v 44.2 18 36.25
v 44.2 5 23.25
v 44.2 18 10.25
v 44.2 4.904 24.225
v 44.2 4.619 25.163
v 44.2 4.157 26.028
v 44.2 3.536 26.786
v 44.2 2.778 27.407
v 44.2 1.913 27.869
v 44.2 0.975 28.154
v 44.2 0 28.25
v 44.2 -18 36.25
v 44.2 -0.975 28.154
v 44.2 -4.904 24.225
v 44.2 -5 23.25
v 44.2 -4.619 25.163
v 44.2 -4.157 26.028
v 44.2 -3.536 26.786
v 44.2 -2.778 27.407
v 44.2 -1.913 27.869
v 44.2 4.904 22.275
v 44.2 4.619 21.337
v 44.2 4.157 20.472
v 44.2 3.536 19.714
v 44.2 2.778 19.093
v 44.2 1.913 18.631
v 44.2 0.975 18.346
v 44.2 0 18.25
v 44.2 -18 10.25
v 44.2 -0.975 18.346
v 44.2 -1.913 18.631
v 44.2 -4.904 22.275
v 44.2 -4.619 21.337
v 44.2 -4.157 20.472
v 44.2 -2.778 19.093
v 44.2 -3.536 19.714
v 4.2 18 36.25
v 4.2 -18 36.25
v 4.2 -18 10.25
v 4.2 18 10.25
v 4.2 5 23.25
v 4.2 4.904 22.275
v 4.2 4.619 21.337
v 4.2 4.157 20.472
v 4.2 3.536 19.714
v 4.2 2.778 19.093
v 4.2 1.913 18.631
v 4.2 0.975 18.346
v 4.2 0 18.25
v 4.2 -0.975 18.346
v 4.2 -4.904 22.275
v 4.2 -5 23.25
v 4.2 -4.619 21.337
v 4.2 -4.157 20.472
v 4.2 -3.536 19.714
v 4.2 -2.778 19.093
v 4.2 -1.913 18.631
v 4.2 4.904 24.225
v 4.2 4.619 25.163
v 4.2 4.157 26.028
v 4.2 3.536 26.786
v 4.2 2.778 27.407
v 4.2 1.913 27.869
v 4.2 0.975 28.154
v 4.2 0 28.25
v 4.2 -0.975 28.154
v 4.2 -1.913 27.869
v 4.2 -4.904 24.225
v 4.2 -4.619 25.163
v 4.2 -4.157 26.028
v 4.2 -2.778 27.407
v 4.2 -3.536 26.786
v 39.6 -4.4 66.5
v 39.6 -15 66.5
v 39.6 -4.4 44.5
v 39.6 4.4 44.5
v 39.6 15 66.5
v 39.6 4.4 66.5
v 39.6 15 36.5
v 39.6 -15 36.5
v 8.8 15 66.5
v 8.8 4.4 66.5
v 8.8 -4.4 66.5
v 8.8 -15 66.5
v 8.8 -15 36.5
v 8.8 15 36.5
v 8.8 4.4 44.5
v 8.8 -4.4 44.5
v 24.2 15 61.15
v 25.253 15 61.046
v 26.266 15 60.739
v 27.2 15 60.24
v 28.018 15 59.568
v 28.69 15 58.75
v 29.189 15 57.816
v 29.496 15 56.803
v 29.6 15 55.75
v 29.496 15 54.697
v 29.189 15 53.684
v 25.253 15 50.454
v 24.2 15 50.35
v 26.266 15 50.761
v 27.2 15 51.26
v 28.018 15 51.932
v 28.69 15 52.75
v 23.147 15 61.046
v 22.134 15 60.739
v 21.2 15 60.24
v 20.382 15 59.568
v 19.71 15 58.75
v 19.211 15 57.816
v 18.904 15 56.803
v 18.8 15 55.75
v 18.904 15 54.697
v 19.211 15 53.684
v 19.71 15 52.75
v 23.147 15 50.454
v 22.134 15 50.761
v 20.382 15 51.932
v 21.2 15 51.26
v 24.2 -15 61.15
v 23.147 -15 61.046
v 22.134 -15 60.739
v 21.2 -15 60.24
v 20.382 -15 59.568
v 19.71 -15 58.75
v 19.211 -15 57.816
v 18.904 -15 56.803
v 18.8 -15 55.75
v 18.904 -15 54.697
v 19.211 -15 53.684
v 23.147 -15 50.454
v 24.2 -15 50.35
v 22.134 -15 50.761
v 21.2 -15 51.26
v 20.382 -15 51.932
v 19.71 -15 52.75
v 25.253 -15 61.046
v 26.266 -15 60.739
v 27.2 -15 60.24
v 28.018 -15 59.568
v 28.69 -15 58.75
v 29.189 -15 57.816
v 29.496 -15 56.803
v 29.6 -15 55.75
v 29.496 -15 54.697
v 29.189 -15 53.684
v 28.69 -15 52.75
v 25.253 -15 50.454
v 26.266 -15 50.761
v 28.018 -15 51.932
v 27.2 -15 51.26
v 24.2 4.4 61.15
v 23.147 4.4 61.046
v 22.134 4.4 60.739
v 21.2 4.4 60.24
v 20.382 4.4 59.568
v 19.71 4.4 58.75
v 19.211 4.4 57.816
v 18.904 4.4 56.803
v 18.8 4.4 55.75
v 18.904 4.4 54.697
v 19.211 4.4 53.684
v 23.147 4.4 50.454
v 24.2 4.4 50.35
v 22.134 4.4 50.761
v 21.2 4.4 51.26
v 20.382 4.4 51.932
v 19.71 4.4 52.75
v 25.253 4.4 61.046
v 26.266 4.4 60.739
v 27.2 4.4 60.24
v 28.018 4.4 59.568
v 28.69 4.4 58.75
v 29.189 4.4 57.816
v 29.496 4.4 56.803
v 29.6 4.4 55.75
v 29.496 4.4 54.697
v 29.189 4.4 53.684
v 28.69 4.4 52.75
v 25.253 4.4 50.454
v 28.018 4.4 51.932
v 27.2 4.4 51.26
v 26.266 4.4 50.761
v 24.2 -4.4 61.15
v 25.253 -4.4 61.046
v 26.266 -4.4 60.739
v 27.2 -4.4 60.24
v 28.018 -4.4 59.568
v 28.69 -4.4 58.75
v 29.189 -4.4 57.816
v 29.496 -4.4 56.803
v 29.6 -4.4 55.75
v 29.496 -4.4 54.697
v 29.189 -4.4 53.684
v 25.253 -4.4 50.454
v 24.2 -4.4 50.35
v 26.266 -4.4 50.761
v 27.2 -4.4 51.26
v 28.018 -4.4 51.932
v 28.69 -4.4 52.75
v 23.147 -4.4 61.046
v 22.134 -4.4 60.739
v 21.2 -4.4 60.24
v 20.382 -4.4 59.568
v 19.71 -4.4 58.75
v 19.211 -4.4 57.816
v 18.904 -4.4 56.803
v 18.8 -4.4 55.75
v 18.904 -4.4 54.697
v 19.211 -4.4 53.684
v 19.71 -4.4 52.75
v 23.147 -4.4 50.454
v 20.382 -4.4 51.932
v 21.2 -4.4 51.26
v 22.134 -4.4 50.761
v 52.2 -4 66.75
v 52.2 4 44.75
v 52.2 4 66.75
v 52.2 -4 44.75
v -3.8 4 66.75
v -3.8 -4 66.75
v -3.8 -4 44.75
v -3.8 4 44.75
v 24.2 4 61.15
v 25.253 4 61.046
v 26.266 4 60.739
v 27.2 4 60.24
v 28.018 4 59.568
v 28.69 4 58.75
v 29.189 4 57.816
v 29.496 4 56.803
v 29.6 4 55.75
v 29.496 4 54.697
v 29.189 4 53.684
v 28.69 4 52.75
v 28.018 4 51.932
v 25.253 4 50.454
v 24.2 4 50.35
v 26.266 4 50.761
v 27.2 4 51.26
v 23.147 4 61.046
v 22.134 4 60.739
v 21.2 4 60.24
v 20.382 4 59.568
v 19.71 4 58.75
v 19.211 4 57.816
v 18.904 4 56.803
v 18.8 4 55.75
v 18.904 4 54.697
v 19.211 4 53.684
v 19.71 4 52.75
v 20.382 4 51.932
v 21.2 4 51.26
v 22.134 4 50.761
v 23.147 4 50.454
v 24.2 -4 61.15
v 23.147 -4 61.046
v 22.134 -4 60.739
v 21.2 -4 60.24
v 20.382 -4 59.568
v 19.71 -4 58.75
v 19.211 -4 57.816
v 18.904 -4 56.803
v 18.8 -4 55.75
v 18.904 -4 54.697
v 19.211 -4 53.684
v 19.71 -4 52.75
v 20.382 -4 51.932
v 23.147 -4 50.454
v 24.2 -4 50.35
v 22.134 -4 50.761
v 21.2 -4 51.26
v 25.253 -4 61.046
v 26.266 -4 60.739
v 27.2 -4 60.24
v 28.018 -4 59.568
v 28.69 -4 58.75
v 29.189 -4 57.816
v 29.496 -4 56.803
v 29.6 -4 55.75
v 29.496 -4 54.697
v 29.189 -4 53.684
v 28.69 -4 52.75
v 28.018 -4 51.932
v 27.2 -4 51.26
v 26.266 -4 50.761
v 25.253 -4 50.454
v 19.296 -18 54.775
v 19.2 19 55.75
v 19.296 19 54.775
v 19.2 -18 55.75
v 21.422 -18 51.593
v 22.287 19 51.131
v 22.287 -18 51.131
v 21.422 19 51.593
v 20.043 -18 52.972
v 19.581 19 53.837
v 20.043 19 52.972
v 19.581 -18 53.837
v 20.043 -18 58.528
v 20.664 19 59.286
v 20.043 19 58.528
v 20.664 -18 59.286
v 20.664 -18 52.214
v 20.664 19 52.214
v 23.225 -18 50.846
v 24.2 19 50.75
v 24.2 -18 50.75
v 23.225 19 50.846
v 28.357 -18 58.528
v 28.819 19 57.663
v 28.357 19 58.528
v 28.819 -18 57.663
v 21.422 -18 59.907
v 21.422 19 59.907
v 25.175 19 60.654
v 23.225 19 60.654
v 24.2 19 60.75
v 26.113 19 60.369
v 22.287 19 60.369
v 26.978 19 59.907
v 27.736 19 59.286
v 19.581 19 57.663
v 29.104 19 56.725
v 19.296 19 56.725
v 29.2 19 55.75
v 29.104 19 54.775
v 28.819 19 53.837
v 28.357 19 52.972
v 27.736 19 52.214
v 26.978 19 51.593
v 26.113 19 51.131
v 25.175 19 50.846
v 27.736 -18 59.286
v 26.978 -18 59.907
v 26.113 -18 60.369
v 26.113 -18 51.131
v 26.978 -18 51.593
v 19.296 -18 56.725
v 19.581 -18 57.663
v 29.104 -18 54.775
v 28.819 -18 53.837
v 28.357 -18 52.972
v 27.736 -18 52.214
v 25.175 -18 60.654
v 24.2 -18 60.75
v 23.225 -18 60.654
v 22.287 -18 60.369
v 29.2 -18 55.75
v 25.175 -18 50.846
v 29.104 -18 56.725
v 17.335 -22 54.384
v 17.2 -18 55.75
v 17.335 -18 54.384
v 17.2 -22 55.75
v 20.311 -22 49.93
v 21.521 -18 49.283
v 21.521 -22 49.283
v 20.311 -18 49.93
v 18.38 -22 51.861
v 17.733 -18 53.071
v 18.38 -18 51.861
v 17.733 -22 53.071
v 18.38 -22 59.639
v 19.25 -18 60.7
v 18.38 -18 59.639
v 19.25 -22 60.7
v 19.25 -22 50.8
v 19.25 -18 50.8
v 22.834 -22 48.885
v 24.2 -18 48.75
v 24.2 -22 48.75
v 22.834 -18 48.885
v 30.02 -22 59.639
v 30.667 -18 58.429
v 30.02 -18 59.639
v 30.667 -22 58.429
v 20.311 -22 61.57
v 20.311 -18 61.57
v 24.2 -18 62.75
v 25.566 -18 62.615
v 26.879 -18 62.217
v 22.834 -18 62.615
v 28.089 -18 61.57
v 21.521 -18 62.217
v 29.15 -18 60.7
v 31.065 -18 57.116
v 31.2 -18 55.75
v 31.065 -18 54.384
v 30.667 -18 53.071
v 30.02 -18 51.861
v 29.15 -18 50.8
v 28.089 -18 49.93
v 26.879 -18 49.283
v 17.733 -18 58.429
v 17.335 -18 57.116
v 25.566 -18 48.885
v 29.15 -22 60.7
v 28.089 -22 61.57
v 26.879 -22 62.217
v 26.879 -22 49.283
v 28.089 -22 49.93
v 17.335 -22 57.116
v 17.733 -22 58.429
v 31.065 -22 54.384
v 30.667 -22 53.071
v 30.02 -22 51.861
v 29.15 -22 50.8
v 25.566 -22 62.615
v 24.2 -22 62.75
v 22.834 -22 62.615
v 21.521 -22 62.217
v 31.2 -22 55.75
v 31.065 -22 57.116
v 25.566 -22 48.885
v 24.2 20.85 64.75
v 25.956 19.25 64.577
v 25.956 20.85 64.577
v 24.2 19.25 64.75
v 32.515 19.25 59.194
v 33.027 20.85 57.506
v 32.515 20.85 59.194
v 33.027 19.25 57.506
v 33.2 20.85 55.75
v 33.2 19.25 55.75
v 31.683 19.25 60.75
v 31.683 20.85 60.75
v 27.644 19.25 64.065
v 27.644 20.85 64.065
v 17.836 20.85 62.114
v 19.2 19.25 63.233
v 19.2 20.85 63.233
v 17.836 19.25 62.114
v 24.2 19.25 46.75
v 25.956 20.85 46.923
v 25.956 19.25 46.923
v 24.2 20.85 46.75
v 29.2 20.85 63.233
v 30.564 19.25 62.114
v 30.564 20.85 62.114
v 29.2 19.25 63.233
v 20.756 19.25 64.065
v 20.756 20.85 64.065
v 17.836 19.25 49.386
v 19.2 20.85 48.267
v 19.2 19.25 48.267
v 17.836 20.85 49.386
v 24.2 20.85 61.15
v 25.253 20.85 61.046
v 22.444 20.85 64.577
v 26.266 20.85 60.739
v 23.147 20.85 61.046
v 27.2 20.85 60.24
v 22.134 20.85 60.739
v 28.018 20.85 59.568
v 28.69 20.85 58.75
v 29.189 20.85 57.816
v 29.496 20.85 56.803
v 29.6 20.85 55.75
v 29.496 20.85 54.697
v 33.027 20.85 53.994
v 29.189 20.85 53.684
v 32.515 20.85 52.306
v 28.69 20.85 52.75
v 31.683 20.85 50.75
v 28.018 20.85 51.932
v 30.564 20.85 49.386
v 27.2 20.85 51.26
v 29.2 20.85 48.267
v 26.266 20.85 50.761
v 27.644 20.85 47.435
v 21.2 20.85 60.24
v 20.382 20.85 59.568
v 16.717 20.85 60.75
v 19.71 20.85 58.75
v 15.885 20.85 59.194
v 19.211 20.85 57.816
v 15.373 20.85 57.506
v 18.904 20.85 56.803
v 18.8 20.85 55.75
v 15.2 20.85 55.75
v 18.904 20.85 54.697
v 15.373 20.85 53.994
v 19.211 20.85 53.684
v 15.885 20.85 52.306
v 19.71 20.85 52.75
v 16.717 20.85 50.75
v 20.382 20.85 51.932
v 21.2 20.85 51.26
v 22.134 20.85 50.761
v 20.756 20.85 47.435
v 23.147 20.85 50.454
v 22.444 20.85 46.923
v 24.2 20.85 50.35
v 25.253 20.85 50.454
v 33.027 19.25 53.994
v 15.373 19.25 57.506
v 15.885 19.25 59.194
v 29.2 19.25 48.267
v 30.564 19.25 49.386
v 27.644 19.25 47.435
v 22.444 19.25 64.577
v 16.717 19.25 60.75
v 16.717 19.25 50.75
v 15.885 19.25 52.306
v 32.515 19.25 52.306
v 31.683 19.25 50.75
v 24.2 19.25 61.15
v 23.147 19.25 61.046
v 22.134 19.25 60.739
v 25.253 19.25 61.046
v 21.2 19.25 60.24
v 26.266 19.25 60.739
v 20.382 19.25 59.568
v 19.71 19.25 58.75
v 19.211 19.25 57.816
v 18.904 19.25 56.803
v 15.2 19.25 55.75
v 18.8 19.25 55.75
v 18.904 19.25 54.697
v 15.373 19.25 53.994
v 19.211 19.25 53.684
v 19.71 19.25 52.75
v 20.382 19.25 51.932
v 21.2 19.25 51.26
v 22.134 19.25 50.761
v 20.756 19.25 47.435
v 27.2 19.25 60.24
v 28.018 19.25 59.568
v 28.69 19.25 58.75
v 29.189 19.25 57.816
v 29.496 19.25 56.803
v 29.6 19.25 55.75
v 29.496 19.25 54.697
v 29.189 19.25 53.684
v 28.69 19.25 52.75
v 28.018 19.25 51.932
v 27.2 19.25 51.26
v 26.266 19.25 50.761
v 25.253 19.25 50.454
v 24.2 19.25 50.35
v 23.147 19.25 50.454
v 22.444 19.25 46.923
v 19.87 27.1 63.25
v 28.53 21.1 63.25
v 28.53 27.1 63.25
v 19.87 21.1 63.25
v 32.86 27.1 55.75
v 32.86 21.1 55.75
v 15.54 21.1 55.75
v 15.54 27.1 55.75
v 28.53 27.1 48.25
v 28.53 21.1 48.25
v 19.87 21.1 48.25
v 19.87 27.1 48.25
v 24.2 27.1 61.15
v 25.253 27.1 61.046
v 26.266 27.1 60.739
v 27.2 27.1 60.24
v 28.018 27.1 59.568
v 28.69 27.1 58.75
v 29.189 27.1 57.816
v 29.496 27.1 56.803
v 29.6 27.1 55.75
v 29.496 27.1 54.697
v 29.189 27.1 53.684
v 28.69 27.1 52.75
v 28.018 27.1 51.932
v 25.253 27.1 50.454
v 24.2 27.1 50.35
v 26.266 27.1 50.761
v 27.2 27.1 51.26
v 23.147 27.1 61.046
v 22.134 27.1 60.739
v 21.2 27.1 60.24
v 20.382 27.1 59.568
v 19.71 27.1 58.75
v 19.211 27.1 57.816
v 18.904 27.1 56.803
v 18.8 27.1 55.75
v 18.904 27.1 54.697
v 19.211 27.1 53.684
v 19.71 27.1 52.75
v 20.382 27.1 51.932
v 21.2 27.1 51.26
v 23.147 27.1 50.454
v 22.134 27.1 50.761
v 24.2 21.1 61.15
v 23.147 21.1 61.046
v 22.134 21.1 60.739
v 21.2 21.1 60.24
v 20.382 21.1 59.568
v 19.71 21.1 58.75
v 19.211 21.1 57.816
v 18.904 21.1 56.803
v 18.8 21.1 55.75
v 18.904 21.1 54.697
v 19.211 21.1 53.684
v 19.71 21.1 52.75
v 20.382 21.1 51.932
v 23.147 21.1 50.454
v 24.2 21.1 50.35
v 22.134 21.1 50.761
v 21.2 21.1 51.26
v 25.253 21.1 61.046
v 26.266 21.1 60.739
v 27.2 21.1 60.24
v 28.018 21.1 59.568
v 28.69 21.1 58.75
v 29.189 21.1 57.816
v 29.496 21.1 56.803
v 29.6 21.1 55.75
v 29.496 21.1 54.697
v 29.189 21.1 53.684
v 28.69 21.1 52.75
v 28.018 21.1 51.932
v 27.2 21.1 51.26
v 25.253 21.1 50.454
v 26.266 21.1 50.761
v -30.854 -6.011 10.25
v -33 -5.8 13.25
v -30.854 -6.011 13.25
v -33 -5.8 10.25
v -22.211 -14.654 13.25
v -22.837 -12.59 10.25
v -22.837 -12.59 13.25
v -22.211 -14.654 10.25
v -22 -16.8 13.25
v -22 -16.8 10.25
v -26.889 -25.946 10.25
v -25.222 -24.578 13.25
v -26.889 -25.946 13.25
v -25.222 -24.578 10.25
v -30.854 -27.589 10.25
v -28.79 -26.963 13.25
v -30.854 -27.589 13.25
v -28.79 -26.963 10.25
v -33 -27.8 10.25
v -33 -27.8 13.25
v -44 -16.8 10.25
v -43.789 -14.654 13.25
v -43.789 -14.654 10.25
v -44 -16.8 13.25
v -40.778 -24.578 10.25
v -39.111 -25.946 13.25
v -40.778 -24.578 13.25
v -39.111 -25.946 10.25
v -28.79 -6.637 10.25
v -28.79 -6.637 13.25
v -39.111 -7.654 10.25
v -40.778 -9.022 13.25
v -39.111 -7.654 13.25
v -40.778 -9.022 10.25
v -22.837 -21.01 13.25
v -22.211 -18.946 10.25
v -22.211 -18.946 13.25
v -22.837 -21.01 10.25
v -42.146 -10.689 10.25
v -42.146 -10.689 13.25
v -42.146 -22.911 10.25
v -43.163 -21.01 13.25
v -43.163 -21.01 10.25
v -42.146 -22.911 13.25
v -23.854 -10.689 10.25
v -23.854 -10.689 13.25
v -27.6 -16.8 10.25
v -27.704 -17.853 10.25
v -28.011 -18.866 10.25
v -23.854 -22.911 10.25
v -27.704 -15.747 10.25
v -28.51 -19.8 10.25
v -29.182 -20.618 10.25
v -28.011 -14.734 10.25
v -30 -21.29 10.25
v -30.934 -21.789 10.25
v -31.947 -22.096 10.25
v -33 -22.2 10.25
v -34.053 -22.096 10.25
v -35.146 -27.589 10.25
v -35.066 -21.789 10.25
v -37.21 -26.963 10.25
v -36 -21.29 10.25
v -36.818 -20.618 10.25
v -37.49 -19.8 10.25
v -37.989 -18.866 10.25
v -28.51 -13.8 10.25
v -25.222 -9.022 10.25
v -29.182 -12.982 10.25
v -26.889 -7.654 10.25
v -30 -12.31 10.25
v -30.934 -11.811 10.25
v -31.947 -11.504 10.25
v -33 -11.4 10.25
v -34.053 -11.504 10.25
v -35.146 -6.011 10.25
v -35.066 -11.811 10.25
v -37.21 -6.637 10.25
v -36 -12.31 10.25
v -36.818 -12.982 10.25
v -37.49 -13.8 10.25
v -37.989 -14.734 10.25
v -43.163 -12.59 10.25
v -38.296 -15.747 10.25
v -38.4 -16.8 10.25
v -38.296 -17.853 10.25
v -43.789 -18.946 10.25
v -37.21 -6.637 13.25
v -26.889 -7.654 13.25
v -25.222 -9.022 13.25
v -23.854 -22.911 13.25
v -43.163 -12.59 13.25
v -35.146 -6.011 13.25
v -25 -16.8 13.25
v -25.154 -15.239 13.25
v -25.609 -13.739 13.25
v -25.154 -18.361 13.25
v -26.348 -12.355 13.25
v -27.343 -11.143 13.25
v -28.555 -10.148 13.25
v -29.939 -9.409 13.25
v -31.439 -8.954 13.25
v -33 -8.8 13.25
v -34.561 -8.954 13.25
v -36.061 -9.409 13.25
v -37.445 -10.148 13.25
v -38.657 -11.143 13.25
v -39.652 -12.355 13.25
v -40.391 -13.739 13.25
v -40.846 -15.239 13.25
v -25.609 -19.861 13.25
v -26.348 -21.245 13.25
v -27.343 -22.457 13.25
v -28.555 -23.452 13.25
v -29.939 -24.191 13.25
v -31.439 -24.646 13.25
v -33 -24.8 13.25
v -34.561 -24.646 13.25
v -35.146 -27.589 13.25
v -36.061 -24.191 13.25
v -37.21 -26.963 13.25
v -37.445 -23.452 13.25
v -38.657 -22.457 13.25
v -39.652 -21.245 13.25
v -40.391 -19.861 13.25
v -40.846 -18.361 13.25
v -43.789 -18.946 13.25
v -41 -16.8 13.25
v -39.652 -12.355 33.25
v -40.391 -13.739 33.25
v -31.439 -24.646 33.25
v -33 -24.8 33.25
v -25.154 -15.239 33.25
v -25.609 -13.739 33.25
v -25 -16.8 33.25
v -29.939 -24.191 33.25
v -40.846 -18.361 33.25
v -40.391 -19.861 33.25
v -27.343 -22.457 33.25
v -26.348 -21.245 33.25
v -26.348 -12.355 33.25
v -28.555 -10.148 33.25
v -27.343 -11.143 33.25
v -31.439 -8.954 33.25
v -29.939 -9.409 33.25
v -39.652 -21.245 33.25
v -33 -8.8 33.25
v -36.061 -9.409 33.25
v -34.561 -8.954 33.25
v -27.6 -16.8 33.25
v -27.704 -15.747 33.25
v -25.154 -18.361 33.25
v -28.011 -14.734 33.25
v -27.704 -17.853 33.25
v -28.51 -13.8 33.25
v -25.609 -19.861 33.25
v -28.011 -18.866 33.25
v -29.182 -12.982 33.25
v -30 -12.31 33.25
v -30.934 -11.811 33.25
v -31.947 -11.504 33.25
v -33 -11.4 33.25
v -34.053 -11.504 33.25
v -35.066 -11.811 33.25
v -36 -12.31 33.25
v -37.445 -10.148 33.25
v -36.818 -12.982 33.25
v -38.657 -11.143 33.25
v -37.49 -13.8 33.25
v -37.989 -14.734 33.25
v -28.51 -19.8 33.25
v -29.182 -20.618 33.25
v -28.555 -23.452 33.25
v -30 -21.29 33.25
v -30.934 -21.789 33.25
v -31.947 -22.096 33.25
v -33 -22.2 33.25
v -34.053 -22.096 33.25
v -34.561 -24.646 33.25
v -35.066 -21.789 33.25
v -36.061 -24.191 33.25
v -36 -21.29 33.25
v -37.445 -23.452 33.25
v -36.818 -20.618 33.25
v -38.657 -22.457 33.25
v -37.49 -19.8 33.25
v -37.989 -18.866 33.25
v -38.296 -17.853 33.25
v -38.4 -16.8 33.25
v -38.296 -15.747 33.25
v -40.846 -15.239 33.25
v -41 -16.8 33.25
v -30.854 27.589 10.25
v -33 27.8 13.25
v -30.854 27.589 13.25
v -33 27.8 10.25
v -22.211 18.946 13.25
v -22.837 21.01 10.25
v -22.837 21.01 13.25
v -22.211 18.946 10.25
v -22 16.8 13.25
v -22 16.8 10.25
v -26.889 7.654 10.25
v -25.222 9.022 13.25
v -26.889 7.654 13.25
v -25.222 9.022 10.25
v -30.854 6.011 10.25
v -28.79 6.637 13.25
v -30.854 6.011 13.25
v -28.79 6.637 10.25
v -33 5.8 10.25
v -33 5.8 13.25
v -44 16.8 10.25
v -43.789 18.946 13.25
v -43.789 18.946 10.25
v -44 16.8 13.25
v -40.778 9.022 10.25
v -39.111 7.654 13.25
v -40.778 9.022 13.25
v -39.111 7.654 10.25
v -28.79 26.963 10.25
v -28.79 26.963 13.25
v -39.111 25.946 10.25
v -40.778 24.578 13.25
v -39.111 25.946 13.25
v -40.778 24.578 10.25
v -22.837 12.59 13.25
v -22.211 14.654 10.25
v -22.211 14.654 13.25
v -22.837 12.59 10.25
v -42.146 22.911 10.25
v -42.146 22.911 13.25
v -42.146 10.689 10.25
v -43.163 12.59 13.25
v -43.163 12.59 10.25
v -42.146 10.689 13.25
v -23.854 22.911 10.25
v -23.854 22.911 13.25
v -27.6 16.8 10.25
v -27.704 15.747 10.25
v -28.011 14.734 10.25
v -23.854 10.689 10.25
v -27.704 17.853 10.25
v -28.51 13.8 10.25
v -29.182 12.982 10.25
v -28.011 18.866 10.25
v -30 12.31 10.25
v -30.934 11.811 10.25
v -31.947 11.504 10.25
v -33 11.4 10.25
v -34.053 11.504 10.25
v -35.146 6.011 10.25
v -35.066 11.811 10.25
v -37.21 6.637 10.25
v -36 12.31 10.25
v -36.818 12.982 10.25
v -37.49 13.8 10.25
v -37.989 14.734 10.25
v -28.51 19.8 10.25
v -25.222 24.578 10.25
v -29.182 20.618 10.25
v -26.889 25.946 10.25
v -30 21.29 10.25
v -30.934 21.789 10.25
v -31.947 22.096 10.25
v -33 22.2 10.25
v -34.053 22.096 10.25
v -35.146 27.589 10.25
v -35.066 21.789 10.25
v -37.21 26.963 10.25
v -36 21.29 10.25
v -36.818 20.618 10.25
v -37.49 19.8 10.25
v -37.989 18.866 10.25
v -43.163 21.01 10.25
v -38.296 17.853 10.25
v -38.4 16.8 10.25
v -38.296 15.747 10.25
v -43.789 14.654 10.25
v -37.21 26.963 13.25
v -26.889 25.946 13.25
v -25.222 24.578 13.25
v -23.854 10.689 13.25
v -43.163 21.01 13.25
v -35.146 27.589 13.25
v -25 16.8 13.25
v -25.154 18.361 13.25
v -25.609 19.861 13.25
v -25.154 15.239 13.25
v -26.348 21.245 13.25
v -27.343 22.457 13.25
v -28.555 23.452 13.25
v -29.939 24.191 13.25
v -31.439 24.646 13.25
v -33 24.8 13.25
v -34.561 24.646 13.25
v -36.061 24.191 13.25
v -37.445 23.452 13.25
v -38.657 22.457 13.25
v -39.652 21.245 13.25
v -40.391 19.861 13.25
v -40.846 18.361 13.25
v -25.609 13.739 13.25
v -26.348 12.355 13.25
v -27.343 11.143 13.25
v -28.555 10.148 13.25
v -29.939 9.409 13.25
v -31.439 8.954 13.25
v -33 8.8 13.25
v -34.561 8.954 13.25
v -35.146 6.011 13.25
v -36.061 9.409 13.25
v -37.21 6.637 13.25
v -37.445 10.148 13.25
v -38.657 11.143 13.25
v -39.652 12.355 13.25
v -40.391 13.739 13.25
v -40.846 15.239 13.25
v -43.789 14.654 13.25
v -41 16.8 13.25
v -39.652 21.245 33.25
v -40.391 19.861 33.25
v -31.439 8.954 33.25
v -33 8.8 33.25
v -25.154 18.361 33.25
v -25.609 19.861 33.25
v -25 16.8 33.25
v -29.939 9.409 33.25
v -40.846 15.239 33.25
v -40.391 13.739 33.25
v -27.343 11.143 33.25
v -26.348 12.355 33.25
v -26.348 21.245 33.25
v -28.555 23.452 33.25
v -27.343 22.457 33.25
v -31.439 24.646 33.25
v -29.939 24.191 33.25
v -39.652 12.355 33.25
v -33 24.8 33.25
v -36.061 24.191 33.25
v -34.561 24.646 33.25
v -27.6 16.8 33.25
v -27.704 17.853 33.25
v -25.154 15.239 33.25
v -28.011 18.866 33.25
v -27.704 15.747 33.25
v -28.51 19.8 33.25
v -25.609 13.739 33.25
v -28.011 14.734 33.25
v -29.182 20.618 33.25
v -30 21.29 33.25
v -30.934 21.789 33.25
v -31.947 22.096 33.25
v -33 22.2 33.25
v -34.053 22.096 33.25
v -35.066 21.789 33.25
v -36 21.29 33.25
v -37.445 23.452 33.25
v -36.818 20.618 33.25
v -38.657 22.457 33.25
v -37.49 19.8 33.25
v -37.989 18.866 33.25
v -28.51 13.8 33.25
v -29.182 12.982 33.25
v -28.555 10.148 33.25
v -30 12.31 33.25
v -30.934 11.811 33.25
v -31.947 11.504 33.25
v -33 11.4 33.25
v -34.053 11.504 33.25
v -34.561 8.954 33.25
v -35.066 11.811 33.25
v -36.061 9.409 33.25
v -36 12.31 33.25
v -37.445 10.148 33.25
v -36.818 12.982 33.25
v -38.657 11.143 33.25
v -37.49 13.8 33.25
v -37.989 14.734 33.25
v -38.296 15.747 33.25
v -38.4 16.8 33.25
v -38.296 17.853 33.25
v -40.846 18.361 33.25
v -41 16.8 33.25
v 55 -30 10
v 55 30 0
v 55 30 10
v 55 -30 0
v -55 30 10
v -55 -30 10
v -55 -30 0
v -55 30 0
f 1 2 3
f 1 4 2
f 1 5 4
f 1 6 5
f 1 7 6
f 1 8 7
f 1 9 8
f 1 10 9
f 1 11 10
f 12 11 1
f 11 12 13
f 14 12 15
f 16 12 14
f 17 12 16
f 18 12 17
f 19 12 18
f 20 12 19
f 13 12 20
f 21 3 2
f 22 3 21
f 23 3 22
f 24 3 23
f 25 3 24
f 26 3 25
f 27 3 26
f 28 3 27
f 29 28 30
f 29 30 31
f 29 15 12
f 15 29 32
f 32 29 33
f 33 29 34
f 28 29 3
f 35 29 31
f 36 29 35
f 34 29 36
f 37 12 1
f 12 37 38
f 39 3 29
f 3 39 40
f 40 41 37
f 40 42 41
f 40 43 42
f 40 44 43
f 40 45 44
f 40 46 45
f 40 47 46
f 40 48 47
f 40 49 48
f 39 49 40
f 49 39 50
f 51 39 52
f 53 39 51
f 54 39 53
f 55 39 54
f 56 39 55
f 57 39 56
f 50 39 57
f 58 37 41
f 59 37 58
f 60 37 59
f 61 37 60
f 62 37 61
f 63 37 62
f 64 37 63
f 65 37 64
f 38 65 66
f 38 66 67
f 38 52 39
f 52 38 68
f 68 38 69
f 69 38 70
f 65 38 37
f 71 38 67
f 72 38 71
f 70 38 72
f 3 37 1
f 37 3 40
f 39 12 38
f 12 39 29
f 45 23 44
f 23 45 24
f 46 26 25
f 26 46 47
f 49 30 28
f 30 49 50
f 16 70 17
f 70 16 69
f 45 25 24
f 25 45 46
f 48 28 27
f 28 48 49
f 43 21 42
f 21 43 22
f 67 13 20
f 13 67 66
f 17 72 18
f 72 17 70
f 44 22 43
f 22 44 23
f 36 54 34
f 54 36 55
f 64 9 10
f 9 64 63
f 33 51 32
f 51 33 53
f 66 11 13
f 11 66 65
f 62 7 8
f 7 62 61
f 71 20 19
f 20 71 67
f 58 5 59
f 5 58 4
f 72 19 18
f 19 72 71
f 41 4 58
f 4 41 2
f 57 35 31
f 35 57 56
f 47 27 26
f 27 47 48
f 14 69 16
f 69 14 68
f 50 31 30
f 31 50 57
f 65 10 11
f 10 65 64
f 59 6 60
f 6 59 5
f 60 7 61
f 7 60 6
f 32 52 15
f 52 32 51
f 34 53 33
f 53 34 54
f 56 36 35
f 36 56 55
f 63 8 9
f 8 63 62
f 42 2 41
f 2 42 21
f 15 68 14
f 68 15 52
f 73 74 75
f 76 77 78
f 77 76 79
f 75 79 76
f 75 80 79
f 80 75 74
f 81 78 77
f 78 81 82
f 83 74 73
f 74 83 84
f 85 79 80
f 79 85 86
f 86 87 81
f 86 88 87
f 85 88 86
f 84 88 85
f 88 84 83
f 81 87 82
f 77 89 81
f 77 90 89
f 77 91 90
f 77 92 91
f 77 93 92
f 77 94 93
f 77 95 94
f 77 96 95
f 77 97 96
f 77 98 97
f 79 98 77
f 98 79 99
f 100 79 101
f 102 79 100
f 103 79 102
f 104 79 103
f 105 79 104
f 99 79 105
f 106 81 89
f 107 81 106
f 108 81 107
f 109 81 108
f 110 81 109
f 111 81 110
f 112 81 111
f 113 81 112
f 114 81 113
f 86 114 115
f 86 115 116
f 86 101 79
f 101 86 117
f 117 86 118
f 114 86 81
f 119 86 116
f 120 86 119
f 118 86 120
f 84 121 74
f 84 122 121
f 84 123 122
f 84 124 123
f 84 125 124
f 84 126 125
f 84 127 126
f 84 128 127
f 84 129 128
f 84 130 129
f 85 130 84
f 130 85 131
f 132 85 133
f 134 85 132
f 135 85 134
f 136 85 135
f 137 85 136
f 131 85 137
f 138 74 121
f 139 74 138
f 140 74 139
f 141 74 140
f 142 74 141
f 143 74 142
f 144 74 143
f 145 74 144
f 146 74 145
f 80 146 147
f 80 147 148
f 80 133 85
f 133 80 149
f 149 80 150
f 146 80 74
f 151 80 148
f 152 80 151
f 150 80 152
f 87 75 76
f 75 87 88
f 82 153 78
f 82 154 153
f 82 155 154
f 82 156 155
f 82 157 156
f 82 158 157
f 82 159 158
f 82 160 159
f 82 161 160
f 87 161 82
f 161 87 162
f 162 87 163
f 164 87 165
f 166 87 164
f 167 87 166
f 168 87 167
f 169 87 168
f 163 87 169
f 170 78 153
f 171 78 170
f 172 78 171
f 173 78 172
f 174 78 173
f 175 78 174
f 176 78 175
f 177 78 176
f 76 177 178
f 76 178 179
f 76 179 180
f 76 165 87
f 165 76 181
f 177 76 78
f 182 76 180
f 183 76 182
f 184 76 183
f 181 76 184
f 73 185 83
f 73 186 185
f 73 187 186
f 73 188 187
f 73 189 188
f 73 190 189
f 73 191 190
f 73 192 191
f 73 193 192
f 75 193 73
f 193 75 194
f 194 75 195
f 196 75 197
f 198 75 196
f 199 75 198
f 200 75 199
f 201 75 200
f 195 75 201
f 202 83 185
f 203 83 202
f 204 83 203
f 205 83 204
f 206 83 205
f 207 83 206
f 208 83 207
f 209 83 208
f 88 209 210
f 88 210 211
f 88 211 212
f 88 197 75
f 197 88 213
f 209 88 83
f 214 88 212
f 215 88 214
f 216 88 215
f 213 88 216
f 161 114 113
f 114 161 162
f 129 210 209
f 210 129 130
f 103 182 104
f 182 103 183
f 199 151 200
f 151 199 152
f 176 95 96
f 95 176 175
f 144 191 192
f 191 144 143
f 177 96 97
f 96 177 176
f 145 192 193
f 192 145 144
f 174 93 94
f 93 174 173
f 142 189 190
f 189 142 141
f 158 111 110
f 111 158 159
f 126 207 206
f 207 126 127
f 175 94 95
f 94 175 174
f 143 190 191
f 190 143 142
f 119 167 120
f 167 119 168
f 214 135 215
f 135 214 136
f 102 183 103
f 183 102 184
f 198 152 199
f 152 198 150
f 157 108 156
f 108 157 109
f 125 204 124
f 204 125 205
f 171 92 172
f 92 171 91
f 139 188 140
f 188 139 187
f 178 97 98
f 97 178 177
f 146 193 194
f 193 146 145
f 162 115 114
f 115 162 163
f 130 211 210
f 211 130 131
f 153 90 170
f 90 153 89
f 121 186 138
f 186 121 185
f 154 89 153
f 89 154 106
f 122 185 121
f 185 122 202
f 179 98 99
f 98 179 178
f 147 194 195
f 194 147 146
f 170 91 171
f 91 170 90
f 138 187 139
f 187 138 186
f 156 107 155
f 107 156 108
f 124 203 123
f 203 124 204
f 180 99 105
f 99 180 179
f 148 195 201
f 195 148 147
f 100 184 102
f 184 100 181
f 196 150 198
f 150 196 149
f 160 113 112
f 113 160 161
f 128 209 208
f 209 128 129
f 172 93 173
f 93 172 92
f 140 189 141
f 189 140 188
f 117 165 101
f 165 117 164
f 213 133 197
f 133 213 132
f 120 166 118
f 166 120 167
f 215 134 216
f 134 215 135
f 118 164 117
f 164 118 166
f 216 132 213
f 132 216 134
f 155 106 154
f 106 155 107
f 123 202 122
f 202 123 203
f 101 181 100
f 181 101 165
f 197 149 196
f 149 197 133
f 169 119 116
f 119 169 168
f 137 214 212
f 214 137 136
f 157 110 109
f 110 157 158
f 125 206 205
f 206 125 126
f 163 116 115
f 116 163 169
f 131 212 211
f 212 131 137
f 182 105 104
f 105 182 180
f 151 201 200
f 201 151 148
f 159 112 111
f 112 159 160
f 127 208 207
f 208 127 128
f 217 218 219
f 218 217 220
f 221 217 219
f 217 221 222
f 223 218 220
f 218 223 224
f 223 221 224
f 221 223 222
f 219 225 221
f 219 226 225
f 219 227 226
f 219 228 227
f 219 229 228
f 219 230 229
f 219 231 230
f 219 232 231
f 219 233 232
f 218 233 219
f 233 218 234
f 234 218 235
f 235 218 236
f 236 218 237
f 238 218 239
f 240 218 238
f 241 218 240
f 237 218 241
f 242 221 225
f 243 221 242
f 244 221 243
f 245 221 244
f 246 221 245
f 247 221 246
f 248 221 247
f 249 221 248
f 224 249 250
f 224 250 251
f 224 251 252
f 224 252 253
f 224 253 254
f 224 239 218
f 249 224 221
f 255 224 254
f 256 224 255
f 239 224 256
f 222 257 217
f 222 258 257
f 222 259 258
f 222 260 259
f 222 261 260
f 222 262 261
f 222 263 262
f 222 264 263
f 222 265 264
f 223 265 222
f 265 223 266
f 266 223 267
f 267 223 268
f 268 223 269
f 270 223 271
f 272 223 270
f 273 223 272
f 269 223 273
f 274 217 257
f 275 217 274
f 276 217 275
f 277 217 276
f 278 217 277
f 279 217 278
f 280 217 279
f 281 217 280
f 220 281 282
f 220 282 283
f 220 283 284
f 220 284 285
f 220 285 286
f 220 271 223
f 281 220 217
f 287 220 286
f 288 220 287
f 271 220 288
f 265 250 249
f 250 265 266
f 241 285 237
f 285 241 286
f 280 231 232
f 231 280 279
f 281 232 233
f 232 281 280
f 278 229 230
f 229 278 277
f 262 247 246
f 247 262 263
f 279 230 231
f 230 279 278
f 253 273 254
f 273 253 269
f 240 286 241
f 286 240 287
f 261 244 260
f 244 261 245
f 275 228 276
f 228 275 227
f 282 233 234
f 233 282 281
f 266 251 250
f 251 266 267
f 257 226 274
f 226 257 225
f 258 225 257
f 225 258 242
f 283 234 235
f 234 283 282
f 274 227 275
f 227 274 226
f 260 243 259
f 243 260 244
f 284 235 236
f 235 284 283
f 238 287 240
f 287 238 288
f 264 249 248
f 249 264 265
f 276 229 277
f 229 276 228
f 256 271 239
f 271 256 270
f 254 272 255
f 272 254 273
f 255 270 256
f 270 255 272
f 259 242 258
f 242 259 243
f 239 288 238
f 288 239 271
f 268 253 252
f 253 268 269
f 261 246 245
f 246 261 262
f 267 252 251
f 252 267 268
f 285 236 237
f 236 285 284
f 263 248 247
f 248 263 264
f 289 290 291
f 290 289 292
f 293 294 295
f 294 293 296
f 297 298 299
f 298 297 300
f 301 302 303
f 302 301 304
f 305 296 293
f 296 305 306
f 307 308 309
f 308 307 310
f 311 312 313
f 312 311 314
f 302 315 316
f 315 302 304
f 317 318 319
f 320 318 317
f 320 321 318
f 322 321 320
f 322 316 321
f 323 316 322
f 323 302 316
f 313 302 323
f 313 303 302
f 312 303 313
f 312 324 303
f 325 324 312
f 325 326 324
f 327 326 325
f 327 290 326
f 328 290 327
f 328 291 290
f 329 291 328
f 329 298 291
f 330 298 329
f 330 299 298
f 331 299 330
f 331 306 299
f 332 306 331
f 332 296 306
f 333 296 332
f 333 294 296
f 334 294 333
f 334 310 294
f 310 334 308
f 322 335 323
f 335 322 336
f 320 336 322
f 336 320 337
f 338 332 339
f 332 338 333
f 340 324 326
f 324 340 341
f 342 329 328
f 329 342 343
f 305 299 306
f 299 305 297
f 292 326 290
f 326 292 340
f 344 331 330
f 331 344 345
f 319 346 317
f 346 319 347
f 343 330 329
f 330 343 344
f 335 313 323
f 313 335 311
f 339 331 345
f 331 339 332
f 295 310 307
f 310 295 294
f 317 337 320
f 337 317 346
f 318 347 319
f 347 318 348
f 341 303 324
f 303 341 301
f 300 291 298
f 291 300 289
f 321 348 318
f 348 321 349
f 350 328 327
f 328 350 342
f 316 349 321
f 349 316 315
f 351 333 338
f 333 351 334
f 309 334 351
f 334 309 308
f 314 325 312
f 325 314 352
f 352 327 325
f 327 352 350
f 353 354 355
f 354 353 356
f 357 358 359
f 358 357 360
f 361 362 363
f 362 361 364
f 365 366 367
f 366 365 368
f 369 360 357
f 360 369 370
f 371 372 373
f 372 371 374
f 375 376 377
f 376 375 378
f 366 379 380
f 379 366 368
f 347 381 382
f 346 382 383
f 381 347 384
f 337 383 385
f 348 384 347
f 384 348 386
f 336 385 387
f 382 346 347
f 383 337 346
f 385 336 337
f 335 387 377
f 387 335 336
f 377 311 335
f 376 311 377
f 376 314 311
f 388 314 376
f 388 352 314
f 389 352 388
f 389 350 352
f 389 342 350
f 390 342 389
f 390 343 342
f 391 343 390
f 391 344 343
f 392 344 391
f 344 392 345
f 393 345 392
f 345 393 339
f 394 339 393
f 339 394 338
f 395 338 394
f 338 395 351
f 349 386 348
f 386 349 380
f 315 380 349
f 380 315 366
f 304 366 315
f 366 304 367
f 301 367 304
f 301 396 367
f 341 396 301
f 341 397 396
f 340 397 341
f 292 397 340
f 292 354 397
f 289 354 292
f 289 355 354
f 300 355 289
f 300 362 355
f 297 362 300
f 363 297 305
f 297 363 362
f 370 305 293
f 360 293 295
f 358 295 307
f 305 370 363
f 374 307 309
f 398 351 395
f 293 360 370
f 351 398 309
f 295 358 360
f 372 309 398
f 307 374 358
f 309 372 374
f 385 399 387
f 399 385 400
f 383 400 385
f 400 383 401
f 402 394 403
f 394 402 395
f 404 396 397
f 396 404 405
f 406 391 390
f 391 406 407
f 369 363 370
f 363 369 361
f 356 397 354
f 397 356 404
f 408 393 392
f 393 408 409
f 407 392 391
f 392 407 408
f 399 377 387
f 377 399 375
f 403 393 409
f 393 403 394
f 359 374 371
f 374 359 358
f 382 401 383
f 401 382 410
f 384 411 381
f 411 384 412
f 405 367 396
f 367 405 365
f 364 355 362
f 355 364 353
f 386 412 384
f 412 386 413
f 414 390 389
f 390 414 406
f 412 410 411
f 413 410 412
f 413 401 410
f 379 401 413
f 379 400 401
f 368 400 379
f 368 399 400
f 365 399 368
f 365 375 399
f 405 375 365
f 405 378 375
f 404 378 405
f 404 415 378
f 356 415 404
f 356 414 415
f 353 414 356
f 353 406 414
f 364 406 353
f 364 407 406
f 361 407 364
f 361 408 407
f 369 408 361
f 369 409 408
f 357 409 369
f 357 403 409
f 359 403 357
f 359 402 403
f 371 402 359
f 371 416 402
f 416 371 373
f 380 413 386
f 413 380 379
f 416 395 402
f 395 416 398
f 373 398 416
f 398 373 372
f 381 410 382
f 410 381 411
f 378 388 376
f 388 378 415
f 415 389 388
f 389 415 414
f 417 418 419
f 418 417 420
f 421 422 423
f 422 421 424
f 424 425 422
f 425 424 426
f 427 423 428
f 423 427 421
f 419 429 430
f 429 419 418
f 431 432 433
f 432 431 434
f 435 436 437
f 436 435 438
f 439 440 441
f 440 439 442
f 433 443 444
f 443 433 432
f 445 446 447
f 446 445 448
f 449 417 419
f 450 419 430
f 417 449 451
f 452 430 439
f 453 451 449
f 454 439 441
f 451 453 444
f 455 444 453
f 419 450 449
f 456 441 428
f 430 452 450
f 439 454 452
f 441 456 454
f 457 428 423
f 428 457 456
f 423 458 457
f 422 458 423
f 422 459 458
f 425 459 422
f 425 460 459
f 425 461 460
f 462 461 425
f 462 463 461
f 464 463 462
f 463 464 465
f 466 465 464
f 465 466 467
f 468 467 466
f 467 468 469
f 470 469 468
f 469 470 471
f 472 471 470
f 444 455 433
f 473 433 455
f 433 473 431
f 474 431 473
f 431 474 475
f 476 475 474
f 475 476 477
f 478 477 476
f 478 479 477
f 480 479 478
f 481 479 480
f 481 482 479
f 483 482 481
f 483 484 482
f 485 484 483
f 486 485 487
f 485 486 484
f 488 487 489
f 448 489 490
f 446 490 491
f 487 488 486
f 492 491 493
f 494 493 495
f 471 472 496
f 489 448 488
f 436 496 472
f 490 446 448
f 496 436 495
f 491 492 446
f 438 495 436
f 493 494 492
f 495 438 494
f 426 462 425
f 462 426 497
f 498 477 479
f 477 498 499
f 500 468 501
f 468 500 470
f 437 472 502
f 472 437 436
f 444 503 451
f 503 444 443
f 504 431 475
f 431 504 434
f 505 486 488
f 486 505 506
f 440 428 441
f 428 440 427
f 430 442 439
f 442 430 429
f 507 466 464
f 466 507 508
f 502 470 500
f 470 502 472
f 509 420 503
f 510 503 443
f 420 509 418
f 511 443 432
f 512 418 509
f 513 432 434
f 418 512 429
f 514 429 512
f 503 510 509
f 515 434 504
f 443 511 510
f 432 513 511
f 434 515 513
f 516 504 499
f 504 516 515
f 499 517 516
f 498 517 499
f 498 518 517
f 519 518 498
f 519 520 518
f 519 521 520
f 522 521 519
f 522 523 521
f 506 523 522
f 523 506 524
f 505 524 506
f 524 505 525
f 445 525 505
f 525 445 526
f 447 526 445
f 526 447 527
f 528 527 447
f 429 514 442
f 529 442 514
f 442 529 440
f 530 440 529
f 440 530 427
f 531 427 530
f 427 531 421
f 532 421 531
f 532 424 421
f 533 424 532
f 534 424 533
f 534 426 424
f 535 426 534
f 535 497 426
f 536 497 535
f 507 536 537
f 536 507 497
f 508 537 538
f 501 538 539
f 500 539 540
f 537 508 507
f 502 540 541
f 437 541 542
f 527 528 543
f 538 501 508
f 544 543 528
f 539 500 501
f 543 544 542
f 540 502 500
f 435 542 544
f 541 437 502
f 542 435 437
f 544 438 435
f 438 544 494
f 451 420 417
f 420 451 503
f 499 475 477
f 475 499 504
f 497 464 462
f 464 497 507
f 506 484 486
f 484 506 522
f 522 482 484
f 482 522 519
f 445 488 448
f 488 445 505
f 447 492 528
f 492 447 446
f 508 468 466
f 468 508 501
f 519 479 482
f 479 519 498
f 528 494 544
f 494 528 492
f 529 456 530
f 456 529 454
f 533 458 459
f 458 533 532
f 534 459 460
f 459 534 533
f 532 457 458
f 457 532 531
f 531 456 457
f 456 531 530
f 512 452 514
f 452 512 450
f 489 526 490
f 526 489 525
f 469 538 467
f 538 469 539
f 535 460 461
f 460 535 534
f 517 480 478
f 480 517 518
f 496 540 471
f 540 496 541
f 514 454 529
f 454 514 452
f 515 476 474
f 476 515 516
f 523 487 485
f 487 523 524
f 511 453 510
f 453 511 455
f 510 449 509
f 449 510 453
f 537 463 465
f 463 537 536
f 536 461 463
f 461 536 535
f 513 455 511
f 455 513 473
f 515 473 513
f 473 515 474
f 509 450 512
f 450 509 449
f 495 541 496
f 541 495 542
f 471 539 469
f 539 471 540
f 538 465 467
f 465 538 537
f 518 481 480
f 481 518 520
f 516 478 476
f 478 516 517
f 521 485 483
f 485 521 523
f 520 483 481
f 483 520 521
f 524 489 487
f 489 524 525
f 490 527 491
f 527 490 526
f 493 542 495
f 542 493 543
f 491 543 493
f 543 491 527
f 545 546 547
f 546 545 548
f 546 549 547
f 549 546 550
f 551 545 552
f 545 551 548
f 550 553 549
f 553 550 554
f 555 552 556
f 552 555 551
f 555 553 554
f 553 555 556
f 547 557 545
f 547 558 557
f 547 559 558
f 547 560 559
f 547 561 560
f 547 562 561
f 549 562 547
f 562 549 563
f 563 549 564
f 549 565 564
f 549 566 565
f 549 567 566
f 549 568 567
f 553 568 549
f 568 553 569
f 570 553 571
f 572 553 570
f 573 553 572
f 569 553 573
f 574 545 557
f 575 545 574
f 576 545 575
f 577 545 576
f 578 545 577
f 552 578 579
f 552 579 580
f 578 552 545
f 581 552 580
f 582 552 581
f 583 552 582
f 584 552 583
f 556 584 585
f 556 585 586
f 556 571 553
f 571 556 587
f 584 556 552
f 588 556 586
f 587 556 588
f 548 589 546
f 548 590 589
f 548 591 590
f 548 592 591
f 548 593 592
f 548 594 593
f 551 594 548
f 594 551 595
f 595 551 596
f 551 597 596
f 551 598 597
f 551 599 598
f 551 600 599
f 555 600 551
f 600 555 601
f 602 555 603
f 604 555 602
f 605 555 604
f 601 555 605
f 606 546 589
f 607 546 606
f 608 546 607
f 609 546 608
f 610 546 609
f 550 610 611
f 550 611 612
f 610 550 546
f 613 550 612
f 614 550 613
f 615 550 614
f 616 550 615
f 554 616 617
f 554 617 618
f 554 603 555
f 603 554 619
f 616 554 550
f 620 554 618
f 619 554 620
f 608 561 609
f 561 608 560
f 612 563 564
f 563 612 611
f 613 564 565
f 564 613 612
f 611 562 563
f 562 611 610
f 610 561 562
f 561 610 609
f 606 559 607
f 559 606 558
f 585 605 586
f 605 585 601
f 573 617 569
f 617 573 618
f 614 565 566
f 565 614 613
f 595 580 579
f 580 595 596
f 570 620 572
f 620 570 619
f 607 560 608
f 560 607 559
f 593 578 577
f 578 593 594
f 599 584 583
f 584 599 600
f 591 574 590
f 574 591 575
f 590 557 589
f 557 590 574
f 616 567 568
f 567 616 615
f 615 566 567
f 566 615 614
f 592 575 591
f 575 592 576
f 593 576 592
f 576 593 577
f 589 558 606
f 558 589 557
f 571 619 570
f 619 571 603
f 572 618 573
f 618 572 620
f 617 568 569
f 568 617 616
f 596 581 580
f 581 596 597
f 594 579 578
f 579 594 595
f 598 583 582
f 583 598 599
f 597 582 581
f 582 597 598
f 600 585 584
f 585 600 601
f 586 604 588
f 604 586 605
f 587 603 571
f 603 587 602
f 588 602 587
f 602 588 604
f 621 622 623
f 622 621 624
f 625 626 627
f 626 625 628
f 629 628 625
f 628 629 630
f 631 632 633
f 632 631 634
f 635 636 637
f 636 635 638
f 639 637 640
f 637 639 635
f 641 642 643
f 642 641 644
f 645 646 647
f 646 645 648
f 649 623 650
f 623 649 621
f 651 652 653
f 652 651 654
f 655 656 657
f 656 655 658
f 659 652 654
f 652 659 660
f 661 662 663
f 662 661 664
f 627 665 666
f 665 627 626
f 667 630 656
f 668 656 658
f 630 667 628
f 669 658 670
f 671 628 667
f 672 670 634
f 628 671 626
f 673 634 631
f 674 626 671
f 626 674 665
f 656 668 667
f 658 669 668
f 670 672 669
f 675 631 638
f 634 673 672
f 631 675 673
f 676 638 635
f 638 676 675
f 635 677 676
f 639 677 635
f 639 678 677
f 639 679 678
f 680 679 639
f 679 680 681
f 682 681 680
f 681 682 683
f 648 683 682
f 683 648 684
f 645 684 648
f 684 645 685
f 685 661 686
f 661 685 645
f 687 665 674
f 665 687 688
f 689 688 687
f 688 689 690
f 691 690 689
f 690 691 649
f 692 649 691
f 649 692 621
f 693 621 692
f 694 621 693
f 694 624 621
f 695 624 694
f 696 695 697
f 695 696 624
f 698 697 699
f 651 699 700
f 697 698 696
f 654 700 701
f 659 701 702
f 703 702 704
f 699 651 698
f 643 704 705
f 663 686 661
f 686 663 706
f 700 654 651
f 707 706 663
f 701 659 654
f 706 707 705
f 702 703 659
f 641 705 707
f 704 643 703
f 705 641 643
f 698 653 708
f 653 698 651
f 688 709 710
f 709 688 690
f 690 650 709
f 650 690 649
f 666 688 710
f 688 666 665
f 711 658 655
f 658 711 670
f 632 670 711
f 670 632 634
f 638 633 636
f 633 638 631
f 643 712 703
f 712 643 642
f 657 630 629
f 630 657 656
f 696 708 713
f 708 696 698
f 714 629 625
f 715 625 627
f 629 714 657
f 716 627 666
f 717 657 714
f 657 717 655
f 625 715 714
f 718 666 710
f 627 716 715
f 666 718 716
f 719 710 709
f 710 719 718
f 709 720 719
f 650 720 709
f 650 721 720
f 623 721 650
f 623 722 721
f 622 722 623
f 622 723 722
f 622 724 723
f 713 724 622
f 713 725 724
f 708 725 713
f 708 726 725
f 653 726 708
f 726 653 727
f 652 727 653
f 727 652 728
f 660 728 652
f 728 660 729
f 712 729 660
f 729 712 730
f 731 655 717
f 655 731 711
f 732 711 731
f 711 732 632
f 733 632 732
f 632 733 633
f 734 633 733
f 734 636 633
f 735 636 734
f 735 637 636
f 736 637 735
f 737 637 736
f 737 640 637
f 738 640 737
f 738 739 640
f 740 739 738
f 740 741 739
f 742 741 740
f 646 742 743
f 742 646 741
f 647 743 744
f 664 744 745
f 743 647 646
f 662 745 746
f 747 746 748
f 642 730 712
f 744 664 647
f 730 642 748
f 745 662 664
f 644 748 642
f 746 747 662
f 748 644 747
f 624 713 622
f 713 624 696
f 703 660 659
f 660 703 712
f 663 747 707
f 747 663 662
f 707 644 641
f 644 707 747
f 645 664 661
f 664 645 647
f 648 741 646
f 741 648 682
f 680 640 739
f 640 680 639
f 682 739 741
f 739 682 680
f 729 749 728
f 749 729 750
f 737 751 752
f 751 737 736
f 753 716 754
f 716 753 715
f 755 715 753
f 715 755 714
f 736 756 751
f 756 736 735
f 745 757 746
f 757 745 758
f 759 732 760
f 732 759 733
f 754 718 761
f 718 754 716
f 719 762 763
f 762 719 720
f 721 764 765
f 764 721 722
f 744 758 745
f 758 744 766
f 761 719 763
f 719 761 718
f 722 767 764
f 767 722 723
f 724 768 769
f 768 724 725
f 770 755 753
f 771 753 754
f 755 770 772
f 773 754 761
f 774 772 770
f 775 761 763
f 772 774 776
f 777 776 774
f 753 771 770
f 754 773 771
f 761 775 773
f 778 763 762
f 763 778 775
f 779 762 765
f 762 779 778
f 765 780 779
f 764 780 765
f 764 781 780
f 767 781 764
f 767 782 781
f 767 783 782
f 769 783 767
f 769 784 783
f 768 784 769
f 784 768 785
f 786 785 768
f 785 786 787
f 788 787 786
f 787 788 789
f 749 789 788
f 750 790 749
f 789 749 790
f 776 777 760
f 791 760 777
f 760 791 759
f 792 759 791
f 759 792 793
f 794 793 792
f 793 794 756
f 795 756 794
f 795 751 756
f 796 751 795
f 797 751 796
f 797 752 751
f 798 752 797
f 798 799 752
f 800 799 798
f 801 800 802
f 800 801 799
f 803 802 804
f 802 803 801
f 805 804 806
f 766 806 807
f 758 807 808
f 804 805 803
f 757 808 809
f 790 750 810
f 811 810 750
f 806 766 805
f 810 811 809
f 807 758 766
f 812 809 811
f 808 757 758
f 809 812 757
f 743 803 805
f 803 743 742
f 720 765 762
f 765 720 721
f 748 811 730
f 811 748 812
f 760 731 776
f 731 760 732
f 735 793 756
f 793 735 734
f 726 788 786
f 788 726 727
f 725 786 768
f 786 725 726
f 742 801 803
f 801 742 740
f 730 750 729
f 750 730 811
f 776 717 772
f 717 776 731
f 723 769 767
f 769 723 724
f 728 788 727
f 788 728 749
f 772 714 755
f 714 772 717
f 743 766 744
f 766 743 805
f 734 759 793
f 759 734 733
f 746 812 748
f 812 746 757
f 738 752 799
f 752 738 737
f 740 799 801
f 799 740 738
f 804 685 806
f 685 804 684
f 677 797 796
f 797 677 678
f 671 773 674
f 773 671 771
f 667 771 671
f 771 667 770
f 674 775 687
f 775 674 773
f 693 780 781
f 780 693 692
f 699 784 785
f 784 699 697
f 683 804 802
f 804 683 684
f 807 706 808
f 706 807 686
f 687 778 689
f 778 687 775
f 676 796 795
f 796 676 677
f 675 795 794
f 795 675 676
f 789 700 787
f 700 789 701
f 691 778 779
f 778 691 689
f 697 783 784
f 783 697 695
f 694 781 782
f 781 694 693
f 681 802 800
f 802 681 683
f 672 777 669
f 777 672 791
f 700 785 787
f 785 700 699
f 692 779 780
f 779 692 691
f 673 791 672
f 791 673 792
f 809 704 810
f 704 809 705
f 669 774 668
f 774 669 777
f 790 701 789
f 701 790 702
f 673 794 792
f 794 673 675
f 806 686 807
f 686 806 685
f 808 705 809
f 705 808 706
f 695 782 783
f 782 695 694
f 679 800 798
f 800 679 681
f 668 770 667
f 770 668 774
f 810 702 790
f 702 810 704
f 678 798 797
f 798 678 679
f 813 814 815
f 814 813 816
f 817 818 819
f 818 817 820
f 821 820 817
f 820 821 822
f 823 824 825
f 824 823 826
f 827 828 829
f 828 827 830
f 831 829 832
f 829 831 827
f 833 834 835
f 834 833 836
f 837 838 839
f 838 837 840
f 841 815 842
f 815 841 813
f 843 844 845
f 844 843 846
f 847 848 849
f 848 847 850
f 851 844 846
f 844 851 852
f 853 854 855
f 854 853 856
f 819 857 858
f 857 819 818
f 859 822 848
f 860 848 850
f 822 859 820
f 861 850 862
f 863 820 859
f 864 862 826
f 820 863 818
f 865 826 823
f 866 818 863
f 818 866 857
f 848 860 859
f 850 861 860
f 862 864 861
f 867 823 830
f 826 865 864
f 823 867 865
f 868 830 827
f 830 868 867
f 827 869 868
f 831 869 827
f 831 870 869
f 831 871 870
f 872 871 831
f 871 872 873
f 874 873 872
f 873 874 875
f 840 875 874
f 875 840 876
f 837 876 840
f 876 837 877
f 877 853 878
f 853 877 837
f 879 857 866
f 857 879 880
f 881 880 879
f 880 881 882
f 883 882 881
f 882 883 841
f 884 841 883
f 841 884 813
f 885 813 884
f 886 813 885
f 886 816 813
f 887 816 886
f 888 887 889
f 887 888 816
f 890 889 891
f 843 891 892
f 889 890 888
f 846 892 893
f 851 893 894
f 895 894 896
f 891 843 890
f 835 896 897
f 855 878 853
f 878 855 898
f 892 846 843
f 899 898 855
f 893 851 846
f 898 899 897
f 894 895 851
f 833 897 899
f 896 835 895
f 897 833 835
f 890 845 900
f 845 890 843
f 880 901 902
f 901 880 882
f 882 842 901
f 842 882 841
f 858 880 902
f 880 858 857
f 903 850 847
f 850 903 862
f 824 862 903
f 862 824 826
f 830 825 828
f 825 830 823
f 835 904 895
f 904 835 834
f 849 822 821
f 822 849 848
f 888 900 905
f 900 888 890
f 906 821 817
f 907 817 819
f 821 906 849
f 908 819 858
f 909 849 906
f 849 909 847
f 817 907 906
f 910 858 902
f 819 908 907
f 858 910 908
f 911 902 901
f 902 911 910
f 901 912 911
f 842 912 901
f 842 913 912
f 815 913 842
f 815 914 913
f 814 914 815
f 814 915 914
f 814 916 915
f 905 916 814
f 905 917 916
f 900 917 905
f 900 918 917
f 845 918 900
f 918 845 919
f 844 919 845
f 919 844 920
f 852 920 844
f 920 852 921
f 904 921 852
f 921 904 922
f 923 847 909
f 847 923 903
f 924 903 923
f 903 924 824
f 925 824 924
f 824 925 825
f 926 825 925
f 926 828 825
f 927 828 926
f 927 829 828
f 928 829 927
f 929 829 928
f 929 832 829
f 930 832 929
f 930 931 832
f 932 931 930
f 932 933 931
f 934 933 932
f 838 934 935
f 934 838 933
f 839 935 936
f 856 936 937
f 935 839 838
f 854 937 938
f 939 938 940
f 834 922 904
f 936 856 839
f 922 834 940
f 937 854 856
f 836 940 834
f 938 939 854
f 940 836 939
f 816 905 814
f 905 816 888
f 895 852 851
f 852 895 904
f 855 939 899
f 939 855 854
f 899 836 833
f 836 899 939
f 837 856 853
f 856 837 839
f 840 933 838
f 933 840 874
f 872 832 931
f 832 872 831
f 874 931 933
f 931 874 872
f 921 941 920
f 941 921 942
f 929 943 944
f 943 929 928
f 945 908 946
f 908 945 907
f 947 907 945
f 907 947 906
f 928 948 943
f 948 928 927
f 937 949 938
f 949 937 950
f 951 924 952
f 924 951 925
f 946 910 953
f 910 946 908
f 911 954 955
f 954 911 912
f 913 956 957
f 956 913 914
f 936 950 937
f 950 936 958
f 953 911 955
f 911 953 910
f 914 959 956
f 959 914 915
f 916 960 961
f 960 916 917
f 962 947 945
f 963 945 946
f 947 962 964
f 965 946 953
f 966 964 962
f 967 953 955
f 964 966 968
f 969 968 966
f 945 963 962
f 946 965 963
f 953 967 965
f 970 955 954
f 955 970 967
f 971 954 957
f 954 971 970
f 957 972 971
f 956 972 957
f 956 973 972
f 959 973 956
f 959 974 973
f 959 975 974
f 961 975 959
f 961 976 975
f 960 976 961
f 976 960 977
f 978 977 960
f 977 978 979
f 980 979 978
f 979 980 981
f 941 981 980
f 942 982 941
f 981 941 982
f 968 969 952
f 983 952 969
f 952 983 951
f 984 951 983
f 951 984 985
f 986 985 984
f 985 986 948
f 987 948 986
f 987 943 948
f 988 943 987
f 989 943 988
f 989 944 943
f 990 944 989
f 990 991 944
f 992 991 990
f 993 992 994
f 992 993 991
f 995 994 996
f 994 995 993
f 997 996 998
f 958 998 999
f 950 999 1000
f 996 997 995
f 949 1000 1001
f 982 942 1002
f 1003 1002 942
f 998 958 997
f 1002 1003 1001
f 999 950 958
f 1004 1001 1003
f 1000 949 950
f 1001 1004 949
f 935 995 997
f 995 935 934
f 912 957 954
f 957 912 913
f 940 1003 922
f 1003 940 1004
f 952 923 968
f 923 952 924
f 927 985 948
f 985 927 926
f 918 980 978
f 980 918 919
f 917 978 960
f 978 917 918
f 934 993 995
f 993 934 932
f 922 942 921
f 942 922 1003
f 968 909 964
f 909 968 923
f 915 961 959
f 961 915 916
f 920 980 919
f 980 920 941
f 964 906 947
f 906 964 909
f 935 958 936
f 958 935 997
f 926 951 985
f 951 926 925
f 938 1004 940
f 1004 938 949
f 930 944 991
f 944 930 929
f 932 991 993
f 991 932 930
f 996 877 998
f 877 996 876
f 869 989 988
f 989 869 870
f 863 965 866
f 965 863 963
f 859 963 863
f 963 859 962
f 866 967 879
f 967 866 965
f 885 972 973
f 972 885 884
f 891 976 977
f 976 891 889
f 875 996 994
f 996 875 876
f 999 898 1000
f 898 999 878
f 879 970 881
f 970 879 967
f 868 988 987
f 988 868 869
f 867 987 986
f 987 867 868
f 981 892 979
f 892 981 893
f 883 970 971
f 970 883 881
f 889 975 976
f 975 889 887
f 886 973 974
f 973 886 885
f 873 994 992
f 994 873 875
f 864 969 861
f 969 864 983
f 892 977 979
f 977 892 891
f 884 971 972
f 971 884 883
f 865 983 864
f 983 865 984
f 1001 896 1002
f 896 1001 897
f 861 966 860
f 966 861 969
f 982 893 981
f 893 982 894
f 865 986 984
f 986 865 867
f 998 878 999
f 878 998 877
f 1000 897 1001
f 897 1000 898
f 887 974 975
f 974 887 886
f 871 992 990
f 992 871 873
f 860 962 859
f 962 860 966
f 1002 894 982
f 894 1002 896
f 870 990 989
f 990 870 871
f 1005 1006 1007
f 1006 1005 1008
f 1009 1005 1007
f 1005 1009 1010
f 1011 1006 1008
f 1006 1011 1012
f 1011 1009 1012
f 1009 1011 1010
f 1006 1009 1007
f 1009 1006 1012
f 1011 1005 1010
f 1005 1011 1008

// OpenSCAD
$fn = 32;

// ------------------------------------------------------------------------
// Indexing jig: plate 110 x 60 mm, pin d10
// Every part is its own module, assembly() places every instance.
// ------------------------------------------------------------------------

// --- part 1 ---
module jig_plate() {
  difference() {
    translate([-55, -30, 0]) cube([110, 60, 10]);
  }
}

// --- part 2 ---
module locator_block() {
  difference() {
    translate([-20, -18, 0]) cube([40, 36, 26]);
    translate([0, 0, 13]) rotate([0, 90, 0]) cylinder(h = 42, d = 10, center = true);
  }
}

// --- part 3 ---
module index_fork() {
  difference() {
    translate([-15.4, -15, 0]) cube([30.8, 30, 30]);
    translate([-16.4, -4.4, 8]) cube([32.8, 8.8, 23]);
    translate([0, 0, 19.25]) rotate([90, 0, 0]) cylinder(h = 32, d = 10.8, center = true);
  }
}

// --- part 4 ---
module index_arm() {
  difference() {
    translate([-28, -4, 0]) cube([56, 8, 22]);
    translate([0, 0, 11]) rotate([90, 0, 0]) cylinder(h = 10, d = 10.8, center = true);
  }
}

// --- part 5 ---
module index_pin() {
  rotate([0, 90, 0]) cylinder(h = 38, d = 10, center = true);
  translate([-22, 0, 0]) rotate([0, 90, 0]) cylinder(h = 4, d = 14);
}

// --- part 6 ---
module pin_washer() {
  difference() {
      translate([0, 0, 0]) cylinder(h = 1.6, d = 18);
      translate([0, 0, -1]) cylinder(h = 3.6, d = 10.8);
    }
}

// --- part 7 ---
module lock_nut() {
  difference() {
    linear_extrude(height = 6) polygon(points = [[8.66, 0], [4.33, 7.5], [-4.33, 7.5], [-8.66, 0], [-4.33, -7.5], [4.33, -7.5]]);
    translate([0, 0, -1]) cylinder(h = 8, d = 10.8);
  }
}

// --- part 8 ---
module guide_bush_a() {
  difference() {
    union() {
      cylinder(h = 3, d = 22);
      translate([0, 0, 3]) cylinder(h = 20, d = 16);
    }
    translate([0, 0, -1]) cylinder(h = 25, d = 10.8);
  }
}

// --- part 9 ---
module guide_bush_b() {
  difference() {
    union() {
      cylinder(h = 3, d = 22);
      translate([0, 0, 3]) cylinder(h = 20, d = 16);
    }
    translate([0, 0, -1]) cylinder(h = 25, d = 10.8);
  }
}

// --- assembly ---
module assembly() {
  color([0.80, 0.24, 0.20]) translate([0, 0, 0]) rotate([0, 0, 0]) jig_plate();
  color([0.20, 0.45, 0.75]) translate([24.2, 0, 10.25]) rotate([0, 0, 0]) locator_block();
  color([0.25, 0.62, 0.32]) translate([24.2, 0, 36.5]) rotate([0, 0, 0]) index_fork();
  color([0.92, 0.70, 0.18]) translate([24.2, 0, 44.75]) rotate([0, 0, 0]) index_arm();
  color([0.58, 0.35, 0.70]) translate([24.2, 0, 55.75]) rotate([0, 0, 90]) index_pin();
  color([0.16, 0.66, 0.66]) translate([24.2, 20.85, 55.75]) rotate([90, 0, 0]) pin_washer();
  color([0.85, 0.48, 0.18]) translate([24.2, 27.1, 55.75]) rotate([90, 0, 0]) lock_nut();
  color([0.55, 0.60, 0.65]) translate([-33, -16.8, 10.25]) rotate([0, 0, 0]) guide_bush_a();
  color([0.75, 0.30, 0.55]) translate([-33, 16.8, 10.25]) rotate([0, 0, 0]) guide_bush_b();
}

assembly();
